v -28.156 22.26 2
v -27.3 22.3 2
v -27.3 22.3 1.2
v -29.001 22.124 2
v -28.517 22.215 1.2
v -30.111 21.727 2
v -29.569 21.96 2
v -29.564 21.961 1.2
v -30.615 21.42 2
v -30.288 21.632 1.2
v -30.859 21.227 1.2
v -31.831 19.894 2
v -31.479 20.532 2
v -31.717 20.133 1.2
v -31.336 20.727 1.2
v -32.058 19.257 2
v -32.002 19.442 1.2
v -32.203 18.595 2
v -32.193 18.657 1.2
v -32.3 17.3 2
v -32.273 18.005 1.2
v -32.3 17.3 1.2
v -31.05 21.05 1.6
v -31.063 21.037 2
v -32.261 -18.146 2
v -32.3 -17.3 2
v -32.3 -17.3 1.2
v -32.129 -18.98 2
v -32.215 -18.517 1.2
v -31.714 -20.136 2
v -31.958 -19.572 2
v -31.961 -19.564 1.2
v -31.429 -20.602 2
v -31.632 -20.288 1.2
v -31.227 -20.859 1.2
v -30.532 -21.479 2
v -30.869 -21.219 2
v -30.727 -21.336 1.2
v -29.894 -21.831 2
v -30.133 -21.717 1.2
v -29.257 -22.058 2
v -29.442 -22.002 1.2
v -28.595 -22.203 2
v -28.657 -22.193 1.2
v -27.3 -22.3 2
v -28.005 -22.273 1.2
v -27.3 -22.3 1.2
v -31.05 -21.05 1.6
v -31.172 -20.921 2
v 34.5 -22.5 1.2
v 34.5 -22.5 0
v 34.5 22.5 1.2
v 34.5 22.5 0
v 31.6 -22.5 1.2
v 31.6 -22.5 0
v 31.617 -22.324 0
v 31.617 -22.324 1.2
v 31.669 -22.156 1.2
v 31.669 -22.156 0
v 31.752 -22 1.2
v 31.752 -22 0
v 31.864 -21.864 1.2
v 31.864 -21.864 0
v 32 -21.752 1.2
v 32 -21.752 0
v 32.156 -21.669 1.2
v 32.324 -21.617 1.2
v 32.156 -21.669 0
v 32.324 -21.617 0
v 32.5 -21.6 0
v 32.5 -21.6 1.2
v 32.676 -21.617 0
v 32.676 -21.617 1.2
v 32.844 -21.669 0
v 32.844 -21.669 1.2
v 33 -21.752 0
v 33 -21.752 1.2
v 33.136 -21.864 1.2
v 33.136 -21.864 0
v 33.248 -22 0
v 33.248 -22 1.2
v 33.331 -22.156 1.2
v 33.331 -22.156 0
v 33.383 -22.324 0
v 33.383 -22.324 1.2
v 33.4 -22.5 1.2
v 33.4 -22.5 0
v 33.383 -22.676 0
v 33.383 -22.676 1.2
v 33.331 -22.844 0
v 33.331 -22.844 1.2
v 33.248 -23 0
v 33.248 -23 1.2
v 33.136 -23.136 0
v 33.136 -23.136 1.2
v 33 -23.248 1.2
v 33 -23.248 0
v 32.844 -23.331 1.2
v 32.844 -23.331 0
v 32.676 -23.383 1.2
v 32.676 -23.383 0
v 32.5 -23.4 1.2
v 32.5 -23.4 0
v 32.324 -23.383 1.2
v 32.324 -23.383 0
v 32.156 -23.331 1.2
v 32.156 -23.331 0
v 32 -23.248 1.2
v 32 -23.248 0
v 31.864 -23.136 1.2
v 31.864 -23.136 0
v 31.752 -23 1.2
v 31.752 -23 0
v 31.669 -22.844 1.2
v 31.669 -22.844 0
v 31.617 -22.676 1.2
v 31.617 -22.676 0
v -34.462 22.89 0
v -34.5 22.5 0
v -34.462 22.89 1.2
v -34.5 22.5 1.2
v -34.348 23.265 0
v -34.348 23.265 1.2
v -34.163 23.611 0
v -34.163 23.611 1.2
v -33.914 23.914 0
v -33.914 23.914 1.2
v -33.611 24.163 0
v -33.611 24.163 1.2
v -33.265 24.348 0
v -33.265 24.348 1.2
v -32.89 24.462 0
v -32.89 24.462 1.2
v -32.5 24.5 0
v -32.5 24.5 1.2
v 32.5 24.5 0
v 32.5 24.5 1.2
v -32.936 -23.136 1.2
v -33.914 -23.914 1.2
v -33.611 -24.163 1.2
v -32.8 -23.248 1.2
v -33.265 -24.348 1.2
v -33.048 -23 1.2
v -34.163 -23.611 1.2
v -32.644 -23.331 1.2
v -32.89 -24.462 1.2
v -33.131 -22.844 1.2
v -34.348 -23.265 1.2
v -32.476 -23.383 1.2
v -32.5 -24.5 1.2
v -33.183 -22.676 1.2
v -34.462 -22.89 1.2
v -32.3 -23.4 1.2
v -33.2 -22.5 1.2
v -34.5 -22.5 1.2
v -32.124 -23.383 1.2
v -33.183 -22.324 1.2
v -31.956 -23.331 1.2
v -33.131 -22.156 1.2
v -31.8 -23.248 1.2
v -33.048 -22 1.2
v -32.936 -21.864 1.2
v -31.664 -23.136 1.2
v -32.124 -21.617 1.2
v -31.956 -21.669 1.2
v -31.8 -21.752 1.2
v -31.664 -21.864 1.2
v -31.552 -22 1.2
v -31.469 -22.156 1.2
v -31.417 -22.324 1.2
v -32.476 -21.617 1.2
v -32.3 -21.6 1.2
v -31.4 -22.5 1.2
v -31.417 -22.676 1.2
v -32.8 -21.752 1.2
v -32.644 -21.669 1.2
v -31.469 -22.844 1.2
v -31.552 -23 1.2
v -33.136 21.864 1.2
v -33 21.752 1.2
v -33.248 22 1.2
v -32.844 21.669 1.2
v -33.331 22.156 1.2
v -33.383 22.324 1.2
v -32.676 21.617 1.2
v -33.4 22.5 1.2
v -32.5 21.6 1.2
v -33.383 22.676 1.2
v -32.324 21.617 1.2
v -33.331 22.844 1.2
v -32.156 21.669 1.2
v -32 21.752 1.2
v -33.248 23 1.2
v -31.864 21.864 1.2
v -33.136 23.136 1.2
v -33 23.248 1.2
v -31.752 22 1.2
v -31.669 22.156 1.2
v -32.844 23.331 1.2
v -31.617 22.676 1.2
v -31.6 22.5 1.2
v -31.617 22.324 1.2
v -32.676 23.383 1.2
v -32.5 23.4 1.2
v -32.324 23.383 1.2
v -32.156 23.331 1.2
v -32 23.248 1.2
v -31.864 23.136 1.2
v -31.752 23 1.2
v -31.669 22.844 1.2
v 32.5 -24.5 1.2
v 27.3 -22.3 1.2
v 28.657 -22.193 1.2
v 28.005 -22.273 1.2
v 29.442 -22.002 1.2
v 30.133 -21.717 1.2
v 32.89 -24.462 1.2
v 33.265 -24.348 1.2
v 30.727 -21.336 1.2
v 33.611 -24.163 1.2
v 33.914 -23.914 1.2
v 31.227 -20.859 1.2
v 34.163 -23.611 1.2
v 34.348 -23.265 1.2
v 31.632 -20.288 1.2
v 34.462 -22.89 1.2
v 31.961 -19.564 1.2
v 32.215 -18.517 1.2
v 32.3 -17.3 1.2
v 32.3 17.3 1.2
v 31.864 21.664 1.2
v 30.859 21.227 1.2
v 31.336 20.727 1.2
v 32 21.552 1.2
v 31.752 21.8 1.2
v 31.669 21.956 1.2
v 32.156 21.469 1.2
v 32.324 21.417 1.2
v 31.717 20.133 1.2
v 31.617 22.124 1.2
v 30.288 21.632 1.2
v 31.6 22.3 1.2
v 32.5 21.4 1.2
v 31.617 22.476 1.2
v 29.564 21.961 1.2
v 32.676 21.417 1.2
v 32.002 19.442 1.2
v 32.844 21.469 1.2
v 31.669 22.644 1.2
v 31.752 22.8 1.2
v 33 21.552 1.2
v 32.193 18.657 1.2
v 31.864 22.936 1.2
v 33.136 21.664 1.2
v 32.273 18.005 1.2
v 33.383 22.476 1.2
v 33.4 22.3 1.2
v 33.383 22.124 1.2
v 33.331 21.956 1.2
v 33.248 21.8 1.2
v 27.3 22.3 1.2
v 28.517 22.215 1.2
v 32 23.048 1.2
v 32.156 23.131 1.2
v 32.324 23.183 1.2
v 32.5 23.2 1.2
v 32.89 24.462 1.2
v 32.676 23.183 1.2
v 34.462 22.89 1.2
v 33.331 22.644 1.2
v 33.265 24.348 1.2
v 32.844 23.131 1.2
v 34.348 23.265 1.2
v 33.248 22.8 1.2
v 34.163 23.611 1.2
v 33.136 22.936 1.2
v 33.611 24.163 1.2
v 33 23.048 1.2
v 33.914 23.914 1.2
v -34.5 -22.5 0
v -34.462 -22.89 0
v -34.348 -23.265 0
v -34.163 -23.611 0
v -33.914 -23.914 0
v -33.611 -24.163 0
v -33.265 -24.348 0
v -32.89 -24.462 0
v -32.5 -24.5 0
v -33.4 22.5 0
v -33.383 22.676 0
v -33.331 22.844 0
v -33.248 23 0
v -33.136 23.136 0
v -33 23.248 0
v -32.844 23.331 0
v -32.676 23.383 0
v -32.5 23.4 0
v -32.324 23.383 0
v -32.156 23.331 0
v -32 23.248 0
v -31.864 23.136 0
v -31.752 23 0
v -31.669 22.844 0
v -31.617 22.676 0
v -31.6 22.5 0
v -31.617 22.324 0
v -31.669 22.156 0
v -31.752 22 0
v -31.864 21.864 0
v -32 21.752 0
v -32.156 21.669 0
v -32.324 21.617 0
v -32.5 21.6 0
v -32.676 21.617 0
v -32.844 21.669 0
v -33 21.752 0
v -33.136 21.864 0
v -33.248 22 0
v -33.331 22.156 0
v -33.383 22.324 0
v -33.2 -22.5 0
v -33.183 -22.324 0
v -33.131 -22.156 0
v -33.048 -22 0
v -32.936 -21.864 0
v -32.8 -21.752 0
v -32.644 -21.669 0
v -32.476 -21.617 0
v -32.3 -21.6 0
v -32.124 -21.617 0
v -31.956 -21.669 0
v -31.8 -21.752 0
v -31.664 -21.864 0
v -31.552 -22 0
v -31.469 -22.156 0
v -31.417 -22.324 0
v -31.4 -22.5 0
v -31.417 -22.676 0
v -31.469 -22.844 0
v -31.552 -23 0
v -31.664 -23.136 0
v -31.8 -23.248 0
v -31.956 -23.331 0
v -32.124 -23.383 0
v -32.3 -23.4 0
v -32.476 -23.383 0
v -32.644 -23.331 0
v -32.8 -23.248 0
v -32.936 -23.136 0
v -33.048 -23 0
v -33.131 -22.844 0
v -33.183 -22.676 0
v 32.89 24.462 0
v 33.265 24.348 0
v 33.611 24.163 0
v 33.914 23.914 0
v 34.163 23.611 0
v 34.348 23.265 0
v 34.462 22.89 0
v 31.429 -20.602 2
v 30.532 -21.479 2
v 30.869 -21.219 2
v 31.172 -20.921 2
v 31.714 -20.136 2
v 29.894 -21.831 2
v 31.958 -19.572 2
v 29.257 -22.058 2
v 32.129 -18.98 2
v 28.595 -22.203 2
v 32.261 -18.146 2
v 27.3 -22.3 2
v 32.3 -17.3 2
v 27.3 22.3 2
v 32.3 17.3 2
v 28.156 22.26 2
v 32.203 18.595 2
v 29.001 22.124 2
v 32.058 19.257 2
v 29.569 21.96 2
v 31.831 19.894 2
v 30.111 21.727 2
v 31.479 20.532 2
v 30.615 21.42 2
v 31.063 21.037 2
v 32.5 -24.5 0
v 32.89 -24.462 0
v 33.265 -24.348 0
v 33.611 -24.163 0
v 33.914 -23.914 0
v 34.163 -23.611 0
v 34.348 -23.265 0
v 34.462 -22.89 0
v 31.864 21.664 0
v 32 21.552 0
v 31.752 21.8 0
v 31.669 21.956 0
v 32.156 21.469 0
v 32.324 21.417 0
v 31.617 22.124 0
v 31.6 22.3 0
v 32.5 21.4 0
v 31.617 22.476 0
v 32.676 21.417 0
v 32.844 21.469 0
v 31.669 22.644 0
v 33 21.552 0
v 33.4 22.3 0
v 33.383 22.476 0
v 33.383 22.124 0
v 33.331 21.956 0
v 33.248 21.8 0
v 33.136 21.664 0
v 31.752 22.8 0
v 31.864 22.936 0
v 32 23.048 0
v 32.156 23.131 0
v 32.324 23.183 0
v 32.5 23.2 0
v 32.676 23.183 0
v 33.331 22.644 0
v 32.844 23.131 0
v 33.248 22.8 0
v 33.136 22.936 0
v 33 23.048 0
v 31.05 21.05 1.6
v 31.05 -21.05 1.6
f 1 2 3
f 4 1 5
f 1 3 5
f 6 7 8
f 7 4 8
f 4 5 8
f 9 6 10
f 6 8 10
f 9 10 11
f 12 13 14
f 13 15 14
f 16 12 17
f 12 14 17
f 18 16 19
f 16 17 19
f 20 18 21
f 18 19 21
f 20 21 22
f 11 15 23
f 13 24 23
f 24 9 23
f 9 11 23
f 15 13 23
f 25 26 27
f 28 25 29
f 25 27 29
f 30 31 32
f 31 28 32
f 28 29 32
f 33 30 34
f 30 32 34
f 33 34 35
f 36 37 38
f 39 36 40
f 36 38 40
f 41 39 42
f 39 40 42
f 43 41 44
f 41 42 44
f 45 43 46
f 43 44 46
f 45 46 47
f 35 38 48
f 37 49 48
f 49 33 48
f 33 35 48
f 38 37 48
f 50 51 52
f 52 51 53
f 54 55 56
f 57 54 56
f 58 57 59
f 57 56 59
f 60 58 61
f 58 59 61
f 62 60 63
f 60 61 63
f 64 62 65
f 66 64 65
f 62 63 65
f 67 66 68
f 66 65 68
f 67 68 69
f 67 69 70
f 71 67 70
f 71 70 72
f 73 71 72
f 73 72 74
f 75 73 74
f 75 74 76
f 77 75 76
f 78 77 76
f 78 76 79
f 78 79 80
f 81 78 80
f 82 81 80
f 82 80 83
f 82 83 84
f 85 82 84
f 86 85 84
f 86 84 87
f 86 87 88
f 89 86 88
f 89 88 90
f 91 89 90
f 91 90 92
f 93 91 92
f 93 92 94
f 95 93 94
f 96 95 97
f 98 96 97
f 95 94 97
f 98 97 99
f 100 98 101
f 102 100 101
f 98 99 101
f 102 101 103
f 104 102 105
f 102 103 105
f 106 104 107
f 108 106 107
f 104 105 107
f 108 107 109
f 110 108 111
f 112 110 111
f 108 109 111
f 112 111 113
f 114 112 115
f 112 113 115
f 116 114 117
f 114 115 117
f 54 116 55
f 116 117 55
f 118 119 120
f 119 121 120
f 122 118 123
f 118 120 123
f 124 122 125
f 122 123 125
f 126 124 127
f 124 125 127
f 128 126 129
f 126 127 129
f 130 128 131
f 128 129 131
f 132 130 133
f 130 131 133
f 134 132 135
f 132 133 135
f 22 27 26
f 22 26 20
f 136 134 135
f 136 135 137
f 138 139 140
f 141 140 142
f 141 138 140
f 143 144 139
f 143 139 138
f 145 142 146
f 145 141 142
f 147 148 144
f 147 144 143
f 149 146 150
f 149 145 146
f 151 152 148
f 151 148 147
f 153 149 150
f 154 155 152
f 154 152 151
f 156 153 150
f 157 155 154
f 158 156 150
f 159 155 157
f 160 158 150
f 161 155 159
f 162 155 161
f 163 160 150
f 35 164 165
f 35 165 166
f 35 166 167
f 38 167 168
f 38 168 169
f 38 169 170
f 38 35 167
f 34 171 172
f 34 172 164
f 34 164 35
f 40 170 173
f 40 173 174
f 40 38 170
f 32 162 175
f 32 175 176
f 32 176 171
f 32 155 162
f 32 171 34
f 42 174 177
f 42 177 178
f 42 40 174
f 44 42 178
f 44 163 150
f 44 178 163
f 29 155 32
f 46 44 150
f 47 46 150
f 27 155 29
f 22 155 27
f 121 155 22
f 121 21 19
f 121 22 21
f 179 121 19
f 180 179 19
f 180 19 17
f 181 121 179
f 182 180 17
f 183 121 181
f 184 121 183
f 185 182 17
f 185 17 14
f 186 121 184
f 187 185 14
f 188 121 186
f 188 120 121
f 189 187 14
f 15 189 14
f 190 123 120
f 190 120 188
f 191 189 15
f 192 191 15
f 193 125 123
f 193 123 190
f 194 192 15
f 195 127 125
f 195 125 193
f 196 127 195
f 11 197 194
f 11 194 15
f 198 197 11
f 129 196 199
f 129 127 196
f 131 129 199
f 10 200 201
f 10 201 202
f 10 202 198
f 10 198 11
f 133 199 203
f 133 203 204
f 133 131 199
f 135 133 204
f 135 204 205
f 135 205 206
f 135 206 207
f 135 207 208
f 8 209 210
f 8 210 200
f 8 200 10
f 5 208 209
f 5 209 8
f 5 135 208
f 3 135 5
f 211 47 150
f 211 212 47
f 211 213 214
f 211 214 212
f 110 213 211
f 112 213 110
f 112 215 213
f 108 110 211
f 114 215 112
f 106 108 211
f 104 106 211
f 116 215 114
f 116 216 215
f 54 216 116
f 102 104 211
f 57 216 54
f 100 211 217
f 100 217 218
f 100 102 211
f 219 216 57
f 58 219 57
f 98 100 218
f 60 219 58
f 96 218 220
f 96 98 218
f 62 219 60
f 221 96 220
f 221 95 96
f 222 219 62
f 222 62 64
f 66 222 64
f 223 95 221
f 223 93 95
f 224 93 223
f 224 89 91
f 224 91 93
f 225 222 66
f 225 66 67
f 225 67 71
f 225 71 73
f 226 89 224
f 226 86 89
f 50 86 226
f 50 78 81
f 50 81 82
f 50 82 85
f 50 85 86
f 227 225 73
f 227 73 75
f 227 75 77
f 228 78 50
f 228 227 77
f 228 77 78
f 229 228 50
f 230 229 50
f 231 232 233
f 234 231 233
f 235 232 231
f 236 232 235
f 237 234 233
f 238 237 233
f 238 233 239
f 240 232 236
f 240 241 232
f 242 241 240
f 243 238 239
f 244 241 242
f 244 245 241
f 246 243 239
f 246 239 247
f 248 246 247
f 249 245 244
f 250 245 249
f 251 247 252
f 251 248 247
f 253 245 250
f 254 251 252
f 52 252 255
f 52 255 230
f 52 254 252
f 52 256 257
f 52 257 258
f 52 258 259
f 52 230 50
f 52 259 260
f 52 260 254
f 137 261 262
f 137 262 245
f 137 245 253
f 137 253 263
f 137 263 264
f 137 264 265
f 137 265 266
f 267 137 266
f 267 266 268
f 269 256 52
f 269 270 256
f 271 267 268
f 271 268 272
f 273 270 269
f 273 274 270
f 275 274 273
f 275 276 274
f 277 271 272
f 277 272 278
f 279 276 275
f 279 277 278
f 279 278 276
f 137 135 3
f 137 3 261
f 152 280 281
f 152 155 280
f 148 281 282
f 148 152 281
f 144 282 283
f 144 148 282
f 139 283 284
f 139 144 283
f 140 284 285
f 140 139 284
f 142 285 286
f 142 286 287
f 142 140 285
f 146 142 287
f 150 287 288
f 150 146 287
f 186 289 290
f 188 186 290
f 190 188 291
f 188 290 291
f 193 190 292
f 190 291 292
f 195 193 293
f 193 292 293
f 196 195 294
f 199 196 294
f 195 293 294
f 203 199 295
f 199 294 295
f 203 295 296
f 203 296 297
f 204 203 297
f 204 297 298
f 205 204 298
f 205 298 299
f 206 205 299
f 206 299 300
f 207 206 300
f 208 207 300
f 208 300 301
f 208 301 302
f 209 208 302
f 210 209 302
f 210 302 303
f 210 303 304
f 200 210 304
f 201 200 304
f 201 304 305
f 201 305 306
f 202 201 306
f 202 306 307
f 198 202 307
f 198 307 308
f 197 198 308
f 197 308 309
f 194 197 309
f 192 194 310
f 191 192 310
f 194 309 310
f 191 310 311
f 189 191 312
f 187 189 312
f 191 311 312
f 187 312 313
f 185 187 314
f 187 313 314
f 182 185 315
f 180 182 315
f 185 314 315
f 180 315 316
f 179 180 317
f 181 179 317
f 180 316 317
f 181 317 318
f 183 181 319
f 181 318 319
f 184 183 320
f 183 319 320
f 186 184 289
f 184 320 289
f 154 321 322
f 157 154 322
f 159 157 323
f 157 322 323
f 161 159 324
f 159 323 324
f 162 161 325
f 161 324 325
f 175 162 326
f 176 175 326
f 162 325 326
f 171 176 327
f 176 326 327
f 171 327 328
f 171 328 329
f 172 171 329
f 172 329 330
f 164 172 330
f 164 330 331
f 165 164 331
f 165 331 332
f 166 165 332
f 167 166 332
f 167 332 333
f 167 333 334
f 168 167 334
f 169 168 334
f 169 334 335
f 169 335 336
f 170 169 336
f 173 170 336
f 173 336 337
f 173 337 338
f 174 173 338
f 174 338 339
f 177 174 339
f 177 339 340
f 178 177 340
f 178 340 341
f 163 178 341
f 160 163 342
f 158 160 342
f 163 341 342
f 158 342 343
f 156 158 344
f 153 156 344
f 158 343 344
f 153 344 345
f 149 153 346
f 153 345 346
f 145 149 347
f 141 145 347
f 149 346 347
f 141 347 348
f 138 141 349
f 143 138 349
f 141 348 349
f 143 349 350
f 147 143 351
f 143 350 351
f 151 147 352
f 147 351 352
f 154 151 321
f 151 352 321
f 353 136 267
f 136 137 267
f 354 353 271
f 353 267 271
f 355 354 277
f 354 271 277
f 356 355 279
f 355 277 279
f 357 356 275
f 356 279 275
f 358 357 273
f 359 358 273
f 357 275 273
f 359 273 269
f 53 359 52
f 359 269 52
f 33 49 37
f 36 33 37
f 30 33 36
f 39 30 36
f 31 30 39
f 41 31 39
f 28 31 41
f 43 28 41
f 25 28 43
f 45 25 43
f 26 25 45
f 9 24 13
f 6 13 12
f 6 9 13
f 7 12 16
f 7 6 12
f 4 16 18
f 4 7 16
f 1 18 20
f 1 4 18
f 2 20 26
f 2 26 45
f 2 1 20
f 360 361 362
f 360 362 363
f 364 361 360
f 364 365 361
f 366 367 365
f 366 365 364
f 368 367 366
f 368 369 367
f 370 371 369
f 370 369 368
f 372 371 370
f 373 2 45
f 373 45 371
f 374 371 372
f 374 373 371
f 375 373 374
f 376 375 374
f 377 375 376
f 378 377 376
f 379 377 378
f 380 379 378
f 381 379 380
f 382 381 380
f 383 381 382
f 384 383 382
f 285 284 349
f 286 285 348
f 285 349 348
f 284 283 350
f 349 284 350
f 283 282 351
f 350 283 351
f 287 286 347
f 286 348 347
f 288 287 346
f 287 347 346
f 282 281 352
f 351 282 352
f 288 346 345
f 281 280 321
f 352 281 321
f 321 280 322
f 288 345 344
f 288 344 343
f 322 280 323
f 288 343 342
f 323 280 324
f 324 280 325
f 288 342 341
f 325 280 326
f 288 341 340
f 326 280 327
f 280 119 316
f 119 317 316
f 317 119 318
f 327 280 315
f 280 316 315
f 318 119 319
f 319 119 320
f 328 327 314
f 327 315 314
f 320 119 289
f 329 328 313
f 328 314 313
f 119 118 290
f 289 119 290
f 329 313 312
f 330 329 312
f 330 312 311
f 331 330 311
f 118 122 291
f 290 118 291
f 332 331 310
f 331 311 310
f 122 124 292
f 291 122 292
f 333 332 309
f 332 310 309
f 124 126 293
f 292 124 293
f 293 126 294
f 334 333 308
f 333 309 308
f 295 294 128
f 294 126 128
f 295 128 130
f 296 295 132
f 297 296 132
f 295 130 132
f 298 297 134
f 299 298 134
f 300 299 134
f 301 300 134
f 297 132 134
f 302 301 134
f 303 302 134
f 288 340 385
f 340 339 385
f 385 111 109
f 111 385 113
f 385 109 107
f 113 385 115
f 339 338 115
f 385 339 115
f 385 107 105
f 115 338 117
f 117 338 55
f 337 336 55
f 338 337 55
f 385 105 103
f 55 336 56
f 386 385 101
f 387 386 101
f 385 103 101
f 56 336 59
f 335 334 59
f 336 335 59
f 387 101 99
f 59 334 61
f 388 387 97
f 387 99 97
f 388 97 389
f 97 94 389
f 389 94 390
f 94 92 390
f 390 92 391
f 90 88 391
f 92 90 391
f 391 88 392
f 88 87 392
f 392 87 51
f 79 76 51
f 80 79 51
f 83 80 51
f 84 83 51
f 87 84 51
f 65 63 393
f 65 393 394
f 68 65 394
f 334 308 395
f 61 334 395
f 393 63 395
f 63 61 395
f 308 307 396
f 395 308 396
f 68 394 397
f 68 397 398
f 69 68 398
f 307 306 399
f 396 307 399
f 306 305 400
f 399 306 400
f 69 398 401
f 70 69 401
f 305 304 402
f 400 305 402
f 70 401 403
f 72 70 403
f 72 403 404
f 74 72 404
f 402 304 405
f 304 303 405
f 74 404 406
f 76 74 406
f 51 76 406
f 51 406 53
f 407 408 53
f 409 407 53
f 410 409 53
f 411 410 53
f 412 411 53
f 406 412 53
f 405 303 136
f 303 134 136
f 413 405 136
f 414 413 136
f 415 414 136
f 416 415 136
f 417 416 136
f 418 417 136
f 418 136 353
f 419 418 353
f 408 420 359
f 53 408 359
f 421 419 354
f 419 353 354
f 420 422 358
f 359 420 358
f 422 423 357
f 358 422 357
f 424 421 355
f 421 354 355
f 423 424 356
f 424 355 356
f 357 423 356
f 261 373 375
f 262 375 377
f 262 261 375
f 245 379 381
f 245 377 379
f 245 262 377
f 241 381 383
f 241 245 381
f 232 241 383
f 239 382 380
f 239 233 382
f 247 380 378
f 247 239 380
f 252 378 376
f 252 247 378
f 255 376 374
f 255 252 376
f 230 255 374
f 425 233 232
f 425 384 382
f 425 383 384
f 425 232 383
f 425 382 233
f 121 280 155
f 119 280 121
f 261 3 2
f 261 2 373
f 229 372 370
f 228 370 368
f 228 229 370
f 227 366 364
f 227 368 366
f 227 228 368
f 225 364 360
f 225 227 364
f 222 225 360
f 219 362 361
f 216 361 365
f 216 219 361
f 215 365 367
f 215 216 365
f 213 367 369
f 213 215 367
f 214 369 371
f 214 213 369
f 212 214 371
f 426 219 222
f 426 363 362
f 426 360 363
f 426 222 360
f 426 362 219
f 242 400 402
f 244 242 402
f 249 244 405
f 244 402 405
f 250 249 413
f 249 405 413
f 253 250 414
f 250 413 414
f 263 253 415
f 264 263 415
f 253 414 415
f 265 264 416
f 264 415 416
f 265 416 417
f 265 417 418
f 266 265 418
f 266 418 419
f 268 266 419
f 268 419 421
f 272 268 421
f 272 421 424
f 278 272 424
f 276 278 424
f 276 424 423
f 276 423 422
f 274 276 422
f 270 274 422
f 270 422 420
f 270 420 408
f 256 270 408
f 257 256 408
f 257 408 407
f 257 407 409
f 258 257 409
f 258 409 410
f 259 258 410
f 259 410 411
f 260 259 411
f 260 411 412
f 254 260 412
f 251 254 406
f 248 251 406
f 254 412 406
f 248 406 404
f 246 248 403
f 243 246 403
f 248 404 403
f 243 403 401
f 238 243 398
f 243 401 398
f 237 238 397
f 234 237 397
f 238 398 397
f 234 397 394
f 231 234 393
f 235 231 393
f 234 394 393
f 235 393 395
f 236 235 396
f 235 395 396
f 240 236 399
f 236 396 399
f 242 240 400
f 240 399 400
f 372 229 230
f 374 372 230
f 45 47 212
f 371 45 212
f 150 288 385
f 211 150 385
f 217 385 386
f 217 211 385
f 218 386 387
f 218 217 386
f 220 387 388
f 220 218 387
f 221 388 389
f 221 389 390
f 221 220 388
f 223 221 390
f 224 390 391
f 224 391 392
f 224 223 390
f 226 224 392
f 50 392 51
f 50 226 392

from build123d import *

# Parameters (mm, degrees)
F0_W        = 64.6
F0_H        = 44.6
F1_DEPTH    = 2
F0_W_2      = 69
F0_H_2      = 49
F2_DEPTH    = 1.2
F3_T1_DEPTH = 13.3
F4_R        = 2
F6_D        = 1.8
F6_DEPTH    = 6
F6_TIP      = 0.5407745571


# Not quite as in the source:
# - a fillet or chamfer that OpenCascade refuses, or shapes differently, is made with other operations: its cross-section is extruded or revolved along the edge and cut away or added
# - the program builds the solid bodies; features that only make, move or delete a surface that nothing else refers to are left out


with BuildPart() as f1:
    # F0 (on Top) → F1 (new body)
    with BuildSketch(Plane.XY):
        Rectangle(F0_W, F0_H)
    extrude(amount=F1_DEPTH)

    # F0 (on Top) → F2 (join)
    with BuildSketch(Plane.XY):
        Rectangle(F0_W_2, F0_H_2)
        Rectangle(F0_W, F0_H, mode=Mode.SUBTRACT)
    extrude(amount=F2_DEPTH)

    # F3: fillet of radius 5 on 4 edges, made by hand

    # F3_s2 → F3_t1 (cut)
    with BuildSketch(Plane.XY.offset(1.2)):
        with BuildLine():
            add(Edge.make_bspline(
                [(-32.3, -17.3), (-32.3, -22.3), (-27.3, -22.3)],
                knots=[0, 0, 0, 1, 1, 1], degree=2, weights=[1, 1, 1]))
            Line((-27.3, -22.3), (-32.3, -22.3))
            Line((-32.3, -22.3), (-32.3, -17.3))
        make_face()
        with BuildLine():
            add(Edge.make_bspline(
                [(32.3, -17.3), (32.3, -22.3), (27.3, -22.3)],
                knots=[0, 0, 0, 1, 1, 1], degree=2, weights=[1, 1, 1]))
            Line((27.3, -22.3), (32.3, -22.3))
            Line((32.3, -22.3), (32.3, -17.3))
        make_face()
        with BuildLine():
            add(Edge.make_bspline(
                [(27.3, 22.3), (32.3, 22.3), (32.3, 17.3)],
                knots=[0, 0, 0, 1, 1, 1], degree=2, weights=[1, 1, 1]))
            Line((32.3, 17.3), (32.3, 22.3))
            Line((32.3, 22.3), (27.3, 22.3))
        make_face()
        with BuildLine():
            add(Edge.make_bspline(
                [(-27.3, 22.3), (-32.3, 22.3), (-32.3, 17.3)],
                knots=[0, 0, 0, 1, 1, 1], degree=2, weights=[1, 1, 1]))
            Line((-32.3, 17.3), (-32.3, 22.3))
            Line((-32.3, 22.3), (-27.3, 22.3))
        make_face()
    extrude(amount=F3_T1_DEPTH, mode=Mode.SUBTRACT)

    # F4
    f4_edges = [f1.edges().sort_by_distance(p)[0] for p in [
        (-34.5, 24.5, 0.6),
        (-34.5, -24.5, 0.6),
        (34.5, 24.5, 0.6),
        (34.5, -24.5, 0.6),
    ]]
    fillet(f4_edges, radius=F4_R)

    # F6
    with Locations(Plane.XY.offset(1.2)):
        with Locations((-32.3, -22.5), (-32.5, 22.5), (32.5, -22.5), (32.5, 22.3)):
            Hole(F6_D / 2, depth=F6_DEPTH)
            with Locations((0, 0, -(F6_DEPTH + F6_TIP / 2))):  # 118° drill point
                Cone(0, F6_D / 2, F6_TIP, mode=Mode.SUBTRACT)


solid = f1.part
